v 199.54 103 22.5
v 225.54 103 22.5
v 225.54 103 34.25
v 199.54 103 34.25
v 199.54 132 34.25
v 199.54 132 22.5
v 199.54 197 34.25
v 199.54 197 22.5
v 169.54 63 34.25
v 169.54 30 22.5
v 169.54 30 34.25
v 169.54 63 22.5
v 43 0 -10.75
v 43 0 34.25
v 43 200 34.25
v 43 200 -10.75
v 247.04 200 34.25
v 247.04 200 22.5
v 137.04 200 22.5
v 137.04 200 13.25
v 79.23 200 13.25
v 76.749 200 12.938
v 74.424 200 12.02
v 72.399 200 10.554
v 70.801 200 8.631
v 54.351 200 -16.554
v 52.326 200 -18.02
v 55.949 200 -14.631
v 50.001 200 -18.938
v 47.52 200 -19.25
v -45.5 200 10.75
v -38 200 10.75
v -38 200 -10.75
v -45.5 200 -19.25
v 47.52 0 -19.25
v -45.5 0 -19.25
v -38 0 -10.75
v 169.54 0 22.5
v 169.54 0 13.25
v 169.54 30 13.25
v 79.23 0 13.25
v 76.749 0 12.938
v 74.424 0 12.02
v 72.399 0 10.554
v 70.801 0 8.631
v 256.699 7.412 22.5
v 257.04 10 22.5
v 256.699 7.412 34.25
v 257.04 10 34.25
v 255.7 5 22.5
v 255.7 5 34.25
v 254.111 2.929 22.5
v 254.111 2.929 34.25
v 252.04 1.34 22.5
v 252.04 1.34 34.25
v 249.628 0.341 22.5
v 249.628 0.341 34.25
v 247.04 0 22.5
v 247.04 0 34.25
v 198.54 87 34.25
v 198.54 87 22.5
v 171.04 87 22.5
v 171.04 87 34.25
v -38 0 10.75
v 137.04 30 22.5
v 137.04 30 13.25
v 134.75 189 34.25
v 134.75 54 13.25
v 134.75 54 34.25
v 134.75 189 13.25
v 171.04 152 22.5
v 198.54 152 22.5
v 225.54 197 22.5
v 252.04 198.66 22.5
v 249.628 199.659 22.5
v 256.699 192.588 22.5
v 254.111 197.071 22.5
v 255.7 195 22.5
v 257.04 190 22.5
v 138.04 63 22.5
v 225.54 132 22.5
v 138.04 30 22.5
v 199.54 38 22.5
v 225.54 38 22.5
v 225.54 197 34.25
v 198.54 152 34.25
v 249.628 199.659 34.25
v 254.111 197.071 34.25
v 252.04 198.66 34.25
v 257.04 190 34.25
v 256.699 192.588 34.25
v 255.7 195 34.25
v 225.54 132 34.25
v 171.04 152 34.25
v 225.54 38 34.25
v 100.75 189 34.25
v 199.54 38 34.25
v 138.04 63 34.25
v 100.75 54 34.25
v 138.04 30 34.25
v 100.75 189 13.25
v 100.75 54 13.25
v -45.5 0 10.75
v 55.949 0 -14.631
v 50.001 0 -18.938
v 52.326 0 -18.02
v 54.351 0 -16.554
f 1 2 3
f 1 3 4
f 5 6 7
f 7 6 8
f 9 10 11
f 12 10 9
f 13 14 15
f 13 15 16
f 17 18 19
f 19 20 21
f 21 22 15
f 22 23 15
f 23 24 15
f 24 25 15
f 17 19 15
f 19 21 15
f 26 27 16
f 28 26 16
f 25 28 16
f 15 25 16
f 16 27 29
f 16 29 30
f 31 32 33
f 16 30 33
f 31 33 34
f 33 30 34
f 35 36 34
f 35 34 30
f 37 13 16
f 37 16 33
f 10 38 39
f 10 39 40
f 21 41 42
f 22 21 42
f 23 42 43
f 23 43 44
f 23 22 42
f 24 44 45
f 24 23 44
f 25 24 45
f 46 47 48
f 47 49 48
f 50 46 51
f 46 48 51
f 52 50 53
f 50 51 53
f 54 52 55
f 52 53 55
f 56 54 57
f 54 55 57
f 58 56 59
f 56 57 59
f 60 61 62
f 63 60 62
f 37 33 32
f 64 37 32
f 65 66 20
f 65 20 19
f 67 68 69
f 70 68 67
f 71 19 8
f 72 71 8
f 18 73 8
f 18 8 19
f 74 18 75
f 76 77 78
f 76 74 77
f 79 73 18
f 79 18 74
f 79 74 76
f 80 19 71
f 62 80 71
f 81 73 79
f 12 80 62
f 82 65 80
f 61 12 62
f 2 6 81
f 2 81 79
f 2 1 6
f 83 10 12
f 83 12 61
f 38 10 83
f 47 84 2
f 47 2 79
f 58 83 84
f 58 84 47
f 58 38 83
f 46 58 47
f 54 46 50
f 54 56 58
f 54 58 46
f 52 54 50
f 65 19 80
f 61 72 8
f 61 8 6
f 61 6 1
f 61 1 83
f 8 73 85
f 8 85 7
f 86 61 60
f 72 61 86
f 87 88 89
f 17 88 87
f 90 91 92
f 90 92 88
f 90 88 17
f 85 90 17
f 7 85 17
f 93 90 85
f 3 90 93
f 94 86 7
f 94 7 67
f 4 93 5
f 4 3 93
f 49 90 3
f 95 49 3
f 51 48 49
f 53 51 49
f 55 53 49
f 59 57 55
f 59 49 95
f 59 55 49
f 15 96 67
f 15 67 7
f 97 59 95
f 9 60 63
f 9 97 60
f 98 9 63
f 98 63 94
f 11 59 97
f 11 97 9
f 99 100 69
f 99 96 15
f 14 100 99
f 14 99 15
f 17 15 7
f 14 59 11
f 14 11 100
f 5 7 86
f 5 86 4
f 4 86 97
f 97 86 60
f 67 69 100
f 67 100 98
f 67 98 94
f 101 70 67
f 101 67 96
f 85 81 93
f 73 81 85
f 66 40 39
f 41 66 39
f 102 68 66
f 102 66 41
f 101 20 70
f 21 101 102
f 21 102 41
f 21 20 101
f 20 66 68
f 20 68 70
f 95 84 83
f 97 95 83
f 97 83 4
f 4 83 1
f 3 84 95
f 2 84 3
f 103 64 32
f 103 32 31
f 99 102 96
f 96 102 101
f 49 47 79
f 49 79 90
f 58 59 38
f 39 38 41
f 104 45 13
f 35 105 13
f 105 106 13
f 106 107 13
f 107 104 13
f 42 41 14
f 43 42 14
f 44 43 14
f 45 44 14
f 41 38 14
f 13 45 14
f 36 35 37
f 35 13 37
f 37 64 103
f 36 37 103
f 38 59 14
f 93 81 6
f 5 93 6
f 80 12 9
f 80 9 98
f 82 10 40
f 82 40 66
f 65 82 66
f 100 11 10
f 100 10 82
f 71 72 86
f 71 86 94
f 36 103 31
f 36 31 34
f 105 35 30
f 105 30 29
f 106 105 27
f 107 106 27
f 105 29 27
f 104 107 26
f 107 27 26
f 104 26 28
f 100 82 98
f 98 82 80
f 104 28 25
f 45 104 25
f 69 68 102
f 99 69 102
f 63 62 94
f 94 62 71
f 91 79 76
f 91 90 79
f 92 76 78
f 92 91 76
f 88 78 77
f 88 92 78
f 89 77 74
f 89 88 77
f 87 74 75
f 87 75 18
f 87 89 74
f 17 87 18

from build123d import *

# Parameters (mm, degrees)
BOSS_EXTRUDE1_DEPTH = 200
SKETCH2_W           = 34
SKETCH2_H           = 135
SKETCH2_W_2         = 26
SKETCH2_H_2         = 65
SKETCH2_W_3         = 27.5
SKETCH2_W_4         = 31.5
SKETCH2_H_3         = 33
CUT_EXTRUDE1_DEPTH  = 200
SKETCH3_W           = 32.5
SKETCH3_H           = 30
BOSS_EXTRUDE2_DEPTH = 9.25
FILLET1_R           = 10


with BuildPart() as part:
    # Sketch1 → Boss-Extrude1 (new body)
    with BuildSketch(Plane(origin=(0, 0, 0), x_dir=(1, 0, 0), z_dir=(0, 1, 0))):
        Polygon((-38, -10.75), (-45.5, -10.75), (-45.5, 19.25), (53, 19.25), (73.75, -13.25), (137.04, -13.25), (137.04, -22.5), (257.04, -22.5), (257.04, -34.25), (43, -34.25), (43, 10.75), (-38, 10.75), align=None)
    extrude(amount=BOSS_EXTRUDE1_DEPTH)

    # Sketch2 → Cut-Extrude1 (cut)
    with BuildSketch(Plane(origin=(0, 0, 13.25), x_dir=(-1, 0, 0), z_dir=(0, 0, -1))):
        with Locations((-117.75, 121.5)):
            Rectangle(SKETCH2_W, SKETCH2_H)
        with Locations((-212.54, 164.5)):
            Rectangle(SKETCH2_W_2, SKETCH2_H_2)
        with Locations((-212.54, 70.5)):
            Rectangle(SKETCH2_W_2, SKETCH2_H_2)
        with Locations((-184.79, 119.5)):
            Rectangle(SKETCH2_W_3, SKETCH2_H_2)
        with Locations((-153.79, 46.5)):
            Rectangle(SKETCH2_W_4, SKETCH2_H_3)
    extrude(amount=-CUT_EXTRUDE1_DEPTH, mode=Mode.SUBTRACT)

    # Sketch3 → Boss-Extrude2 (add)
    with BuildSketch(Plane(origin=(0, 0, 22.5), x_dir=(-1, 0, 0), z_dir=(0, 0, -1))):
        with Locations((-153.29, 15)):
            Rectangle(SKETCH3_W, SKETCH3_H)
    extrude(amount=BOSS_EXTRUDE2_DEPTH)

    # Fillet1
    fillet1_edges = [part.edges().sort_by_distance(p)[0] for p in [
        (257.04, 0, 28.375),
        (257.04, 200, 28.375),
        (53, 100, -19.25),
        (73.75, 100, 13.25),
    ]]
    fillet(fillet1_edges, radius=FILLET1_R)


solid = part.part
